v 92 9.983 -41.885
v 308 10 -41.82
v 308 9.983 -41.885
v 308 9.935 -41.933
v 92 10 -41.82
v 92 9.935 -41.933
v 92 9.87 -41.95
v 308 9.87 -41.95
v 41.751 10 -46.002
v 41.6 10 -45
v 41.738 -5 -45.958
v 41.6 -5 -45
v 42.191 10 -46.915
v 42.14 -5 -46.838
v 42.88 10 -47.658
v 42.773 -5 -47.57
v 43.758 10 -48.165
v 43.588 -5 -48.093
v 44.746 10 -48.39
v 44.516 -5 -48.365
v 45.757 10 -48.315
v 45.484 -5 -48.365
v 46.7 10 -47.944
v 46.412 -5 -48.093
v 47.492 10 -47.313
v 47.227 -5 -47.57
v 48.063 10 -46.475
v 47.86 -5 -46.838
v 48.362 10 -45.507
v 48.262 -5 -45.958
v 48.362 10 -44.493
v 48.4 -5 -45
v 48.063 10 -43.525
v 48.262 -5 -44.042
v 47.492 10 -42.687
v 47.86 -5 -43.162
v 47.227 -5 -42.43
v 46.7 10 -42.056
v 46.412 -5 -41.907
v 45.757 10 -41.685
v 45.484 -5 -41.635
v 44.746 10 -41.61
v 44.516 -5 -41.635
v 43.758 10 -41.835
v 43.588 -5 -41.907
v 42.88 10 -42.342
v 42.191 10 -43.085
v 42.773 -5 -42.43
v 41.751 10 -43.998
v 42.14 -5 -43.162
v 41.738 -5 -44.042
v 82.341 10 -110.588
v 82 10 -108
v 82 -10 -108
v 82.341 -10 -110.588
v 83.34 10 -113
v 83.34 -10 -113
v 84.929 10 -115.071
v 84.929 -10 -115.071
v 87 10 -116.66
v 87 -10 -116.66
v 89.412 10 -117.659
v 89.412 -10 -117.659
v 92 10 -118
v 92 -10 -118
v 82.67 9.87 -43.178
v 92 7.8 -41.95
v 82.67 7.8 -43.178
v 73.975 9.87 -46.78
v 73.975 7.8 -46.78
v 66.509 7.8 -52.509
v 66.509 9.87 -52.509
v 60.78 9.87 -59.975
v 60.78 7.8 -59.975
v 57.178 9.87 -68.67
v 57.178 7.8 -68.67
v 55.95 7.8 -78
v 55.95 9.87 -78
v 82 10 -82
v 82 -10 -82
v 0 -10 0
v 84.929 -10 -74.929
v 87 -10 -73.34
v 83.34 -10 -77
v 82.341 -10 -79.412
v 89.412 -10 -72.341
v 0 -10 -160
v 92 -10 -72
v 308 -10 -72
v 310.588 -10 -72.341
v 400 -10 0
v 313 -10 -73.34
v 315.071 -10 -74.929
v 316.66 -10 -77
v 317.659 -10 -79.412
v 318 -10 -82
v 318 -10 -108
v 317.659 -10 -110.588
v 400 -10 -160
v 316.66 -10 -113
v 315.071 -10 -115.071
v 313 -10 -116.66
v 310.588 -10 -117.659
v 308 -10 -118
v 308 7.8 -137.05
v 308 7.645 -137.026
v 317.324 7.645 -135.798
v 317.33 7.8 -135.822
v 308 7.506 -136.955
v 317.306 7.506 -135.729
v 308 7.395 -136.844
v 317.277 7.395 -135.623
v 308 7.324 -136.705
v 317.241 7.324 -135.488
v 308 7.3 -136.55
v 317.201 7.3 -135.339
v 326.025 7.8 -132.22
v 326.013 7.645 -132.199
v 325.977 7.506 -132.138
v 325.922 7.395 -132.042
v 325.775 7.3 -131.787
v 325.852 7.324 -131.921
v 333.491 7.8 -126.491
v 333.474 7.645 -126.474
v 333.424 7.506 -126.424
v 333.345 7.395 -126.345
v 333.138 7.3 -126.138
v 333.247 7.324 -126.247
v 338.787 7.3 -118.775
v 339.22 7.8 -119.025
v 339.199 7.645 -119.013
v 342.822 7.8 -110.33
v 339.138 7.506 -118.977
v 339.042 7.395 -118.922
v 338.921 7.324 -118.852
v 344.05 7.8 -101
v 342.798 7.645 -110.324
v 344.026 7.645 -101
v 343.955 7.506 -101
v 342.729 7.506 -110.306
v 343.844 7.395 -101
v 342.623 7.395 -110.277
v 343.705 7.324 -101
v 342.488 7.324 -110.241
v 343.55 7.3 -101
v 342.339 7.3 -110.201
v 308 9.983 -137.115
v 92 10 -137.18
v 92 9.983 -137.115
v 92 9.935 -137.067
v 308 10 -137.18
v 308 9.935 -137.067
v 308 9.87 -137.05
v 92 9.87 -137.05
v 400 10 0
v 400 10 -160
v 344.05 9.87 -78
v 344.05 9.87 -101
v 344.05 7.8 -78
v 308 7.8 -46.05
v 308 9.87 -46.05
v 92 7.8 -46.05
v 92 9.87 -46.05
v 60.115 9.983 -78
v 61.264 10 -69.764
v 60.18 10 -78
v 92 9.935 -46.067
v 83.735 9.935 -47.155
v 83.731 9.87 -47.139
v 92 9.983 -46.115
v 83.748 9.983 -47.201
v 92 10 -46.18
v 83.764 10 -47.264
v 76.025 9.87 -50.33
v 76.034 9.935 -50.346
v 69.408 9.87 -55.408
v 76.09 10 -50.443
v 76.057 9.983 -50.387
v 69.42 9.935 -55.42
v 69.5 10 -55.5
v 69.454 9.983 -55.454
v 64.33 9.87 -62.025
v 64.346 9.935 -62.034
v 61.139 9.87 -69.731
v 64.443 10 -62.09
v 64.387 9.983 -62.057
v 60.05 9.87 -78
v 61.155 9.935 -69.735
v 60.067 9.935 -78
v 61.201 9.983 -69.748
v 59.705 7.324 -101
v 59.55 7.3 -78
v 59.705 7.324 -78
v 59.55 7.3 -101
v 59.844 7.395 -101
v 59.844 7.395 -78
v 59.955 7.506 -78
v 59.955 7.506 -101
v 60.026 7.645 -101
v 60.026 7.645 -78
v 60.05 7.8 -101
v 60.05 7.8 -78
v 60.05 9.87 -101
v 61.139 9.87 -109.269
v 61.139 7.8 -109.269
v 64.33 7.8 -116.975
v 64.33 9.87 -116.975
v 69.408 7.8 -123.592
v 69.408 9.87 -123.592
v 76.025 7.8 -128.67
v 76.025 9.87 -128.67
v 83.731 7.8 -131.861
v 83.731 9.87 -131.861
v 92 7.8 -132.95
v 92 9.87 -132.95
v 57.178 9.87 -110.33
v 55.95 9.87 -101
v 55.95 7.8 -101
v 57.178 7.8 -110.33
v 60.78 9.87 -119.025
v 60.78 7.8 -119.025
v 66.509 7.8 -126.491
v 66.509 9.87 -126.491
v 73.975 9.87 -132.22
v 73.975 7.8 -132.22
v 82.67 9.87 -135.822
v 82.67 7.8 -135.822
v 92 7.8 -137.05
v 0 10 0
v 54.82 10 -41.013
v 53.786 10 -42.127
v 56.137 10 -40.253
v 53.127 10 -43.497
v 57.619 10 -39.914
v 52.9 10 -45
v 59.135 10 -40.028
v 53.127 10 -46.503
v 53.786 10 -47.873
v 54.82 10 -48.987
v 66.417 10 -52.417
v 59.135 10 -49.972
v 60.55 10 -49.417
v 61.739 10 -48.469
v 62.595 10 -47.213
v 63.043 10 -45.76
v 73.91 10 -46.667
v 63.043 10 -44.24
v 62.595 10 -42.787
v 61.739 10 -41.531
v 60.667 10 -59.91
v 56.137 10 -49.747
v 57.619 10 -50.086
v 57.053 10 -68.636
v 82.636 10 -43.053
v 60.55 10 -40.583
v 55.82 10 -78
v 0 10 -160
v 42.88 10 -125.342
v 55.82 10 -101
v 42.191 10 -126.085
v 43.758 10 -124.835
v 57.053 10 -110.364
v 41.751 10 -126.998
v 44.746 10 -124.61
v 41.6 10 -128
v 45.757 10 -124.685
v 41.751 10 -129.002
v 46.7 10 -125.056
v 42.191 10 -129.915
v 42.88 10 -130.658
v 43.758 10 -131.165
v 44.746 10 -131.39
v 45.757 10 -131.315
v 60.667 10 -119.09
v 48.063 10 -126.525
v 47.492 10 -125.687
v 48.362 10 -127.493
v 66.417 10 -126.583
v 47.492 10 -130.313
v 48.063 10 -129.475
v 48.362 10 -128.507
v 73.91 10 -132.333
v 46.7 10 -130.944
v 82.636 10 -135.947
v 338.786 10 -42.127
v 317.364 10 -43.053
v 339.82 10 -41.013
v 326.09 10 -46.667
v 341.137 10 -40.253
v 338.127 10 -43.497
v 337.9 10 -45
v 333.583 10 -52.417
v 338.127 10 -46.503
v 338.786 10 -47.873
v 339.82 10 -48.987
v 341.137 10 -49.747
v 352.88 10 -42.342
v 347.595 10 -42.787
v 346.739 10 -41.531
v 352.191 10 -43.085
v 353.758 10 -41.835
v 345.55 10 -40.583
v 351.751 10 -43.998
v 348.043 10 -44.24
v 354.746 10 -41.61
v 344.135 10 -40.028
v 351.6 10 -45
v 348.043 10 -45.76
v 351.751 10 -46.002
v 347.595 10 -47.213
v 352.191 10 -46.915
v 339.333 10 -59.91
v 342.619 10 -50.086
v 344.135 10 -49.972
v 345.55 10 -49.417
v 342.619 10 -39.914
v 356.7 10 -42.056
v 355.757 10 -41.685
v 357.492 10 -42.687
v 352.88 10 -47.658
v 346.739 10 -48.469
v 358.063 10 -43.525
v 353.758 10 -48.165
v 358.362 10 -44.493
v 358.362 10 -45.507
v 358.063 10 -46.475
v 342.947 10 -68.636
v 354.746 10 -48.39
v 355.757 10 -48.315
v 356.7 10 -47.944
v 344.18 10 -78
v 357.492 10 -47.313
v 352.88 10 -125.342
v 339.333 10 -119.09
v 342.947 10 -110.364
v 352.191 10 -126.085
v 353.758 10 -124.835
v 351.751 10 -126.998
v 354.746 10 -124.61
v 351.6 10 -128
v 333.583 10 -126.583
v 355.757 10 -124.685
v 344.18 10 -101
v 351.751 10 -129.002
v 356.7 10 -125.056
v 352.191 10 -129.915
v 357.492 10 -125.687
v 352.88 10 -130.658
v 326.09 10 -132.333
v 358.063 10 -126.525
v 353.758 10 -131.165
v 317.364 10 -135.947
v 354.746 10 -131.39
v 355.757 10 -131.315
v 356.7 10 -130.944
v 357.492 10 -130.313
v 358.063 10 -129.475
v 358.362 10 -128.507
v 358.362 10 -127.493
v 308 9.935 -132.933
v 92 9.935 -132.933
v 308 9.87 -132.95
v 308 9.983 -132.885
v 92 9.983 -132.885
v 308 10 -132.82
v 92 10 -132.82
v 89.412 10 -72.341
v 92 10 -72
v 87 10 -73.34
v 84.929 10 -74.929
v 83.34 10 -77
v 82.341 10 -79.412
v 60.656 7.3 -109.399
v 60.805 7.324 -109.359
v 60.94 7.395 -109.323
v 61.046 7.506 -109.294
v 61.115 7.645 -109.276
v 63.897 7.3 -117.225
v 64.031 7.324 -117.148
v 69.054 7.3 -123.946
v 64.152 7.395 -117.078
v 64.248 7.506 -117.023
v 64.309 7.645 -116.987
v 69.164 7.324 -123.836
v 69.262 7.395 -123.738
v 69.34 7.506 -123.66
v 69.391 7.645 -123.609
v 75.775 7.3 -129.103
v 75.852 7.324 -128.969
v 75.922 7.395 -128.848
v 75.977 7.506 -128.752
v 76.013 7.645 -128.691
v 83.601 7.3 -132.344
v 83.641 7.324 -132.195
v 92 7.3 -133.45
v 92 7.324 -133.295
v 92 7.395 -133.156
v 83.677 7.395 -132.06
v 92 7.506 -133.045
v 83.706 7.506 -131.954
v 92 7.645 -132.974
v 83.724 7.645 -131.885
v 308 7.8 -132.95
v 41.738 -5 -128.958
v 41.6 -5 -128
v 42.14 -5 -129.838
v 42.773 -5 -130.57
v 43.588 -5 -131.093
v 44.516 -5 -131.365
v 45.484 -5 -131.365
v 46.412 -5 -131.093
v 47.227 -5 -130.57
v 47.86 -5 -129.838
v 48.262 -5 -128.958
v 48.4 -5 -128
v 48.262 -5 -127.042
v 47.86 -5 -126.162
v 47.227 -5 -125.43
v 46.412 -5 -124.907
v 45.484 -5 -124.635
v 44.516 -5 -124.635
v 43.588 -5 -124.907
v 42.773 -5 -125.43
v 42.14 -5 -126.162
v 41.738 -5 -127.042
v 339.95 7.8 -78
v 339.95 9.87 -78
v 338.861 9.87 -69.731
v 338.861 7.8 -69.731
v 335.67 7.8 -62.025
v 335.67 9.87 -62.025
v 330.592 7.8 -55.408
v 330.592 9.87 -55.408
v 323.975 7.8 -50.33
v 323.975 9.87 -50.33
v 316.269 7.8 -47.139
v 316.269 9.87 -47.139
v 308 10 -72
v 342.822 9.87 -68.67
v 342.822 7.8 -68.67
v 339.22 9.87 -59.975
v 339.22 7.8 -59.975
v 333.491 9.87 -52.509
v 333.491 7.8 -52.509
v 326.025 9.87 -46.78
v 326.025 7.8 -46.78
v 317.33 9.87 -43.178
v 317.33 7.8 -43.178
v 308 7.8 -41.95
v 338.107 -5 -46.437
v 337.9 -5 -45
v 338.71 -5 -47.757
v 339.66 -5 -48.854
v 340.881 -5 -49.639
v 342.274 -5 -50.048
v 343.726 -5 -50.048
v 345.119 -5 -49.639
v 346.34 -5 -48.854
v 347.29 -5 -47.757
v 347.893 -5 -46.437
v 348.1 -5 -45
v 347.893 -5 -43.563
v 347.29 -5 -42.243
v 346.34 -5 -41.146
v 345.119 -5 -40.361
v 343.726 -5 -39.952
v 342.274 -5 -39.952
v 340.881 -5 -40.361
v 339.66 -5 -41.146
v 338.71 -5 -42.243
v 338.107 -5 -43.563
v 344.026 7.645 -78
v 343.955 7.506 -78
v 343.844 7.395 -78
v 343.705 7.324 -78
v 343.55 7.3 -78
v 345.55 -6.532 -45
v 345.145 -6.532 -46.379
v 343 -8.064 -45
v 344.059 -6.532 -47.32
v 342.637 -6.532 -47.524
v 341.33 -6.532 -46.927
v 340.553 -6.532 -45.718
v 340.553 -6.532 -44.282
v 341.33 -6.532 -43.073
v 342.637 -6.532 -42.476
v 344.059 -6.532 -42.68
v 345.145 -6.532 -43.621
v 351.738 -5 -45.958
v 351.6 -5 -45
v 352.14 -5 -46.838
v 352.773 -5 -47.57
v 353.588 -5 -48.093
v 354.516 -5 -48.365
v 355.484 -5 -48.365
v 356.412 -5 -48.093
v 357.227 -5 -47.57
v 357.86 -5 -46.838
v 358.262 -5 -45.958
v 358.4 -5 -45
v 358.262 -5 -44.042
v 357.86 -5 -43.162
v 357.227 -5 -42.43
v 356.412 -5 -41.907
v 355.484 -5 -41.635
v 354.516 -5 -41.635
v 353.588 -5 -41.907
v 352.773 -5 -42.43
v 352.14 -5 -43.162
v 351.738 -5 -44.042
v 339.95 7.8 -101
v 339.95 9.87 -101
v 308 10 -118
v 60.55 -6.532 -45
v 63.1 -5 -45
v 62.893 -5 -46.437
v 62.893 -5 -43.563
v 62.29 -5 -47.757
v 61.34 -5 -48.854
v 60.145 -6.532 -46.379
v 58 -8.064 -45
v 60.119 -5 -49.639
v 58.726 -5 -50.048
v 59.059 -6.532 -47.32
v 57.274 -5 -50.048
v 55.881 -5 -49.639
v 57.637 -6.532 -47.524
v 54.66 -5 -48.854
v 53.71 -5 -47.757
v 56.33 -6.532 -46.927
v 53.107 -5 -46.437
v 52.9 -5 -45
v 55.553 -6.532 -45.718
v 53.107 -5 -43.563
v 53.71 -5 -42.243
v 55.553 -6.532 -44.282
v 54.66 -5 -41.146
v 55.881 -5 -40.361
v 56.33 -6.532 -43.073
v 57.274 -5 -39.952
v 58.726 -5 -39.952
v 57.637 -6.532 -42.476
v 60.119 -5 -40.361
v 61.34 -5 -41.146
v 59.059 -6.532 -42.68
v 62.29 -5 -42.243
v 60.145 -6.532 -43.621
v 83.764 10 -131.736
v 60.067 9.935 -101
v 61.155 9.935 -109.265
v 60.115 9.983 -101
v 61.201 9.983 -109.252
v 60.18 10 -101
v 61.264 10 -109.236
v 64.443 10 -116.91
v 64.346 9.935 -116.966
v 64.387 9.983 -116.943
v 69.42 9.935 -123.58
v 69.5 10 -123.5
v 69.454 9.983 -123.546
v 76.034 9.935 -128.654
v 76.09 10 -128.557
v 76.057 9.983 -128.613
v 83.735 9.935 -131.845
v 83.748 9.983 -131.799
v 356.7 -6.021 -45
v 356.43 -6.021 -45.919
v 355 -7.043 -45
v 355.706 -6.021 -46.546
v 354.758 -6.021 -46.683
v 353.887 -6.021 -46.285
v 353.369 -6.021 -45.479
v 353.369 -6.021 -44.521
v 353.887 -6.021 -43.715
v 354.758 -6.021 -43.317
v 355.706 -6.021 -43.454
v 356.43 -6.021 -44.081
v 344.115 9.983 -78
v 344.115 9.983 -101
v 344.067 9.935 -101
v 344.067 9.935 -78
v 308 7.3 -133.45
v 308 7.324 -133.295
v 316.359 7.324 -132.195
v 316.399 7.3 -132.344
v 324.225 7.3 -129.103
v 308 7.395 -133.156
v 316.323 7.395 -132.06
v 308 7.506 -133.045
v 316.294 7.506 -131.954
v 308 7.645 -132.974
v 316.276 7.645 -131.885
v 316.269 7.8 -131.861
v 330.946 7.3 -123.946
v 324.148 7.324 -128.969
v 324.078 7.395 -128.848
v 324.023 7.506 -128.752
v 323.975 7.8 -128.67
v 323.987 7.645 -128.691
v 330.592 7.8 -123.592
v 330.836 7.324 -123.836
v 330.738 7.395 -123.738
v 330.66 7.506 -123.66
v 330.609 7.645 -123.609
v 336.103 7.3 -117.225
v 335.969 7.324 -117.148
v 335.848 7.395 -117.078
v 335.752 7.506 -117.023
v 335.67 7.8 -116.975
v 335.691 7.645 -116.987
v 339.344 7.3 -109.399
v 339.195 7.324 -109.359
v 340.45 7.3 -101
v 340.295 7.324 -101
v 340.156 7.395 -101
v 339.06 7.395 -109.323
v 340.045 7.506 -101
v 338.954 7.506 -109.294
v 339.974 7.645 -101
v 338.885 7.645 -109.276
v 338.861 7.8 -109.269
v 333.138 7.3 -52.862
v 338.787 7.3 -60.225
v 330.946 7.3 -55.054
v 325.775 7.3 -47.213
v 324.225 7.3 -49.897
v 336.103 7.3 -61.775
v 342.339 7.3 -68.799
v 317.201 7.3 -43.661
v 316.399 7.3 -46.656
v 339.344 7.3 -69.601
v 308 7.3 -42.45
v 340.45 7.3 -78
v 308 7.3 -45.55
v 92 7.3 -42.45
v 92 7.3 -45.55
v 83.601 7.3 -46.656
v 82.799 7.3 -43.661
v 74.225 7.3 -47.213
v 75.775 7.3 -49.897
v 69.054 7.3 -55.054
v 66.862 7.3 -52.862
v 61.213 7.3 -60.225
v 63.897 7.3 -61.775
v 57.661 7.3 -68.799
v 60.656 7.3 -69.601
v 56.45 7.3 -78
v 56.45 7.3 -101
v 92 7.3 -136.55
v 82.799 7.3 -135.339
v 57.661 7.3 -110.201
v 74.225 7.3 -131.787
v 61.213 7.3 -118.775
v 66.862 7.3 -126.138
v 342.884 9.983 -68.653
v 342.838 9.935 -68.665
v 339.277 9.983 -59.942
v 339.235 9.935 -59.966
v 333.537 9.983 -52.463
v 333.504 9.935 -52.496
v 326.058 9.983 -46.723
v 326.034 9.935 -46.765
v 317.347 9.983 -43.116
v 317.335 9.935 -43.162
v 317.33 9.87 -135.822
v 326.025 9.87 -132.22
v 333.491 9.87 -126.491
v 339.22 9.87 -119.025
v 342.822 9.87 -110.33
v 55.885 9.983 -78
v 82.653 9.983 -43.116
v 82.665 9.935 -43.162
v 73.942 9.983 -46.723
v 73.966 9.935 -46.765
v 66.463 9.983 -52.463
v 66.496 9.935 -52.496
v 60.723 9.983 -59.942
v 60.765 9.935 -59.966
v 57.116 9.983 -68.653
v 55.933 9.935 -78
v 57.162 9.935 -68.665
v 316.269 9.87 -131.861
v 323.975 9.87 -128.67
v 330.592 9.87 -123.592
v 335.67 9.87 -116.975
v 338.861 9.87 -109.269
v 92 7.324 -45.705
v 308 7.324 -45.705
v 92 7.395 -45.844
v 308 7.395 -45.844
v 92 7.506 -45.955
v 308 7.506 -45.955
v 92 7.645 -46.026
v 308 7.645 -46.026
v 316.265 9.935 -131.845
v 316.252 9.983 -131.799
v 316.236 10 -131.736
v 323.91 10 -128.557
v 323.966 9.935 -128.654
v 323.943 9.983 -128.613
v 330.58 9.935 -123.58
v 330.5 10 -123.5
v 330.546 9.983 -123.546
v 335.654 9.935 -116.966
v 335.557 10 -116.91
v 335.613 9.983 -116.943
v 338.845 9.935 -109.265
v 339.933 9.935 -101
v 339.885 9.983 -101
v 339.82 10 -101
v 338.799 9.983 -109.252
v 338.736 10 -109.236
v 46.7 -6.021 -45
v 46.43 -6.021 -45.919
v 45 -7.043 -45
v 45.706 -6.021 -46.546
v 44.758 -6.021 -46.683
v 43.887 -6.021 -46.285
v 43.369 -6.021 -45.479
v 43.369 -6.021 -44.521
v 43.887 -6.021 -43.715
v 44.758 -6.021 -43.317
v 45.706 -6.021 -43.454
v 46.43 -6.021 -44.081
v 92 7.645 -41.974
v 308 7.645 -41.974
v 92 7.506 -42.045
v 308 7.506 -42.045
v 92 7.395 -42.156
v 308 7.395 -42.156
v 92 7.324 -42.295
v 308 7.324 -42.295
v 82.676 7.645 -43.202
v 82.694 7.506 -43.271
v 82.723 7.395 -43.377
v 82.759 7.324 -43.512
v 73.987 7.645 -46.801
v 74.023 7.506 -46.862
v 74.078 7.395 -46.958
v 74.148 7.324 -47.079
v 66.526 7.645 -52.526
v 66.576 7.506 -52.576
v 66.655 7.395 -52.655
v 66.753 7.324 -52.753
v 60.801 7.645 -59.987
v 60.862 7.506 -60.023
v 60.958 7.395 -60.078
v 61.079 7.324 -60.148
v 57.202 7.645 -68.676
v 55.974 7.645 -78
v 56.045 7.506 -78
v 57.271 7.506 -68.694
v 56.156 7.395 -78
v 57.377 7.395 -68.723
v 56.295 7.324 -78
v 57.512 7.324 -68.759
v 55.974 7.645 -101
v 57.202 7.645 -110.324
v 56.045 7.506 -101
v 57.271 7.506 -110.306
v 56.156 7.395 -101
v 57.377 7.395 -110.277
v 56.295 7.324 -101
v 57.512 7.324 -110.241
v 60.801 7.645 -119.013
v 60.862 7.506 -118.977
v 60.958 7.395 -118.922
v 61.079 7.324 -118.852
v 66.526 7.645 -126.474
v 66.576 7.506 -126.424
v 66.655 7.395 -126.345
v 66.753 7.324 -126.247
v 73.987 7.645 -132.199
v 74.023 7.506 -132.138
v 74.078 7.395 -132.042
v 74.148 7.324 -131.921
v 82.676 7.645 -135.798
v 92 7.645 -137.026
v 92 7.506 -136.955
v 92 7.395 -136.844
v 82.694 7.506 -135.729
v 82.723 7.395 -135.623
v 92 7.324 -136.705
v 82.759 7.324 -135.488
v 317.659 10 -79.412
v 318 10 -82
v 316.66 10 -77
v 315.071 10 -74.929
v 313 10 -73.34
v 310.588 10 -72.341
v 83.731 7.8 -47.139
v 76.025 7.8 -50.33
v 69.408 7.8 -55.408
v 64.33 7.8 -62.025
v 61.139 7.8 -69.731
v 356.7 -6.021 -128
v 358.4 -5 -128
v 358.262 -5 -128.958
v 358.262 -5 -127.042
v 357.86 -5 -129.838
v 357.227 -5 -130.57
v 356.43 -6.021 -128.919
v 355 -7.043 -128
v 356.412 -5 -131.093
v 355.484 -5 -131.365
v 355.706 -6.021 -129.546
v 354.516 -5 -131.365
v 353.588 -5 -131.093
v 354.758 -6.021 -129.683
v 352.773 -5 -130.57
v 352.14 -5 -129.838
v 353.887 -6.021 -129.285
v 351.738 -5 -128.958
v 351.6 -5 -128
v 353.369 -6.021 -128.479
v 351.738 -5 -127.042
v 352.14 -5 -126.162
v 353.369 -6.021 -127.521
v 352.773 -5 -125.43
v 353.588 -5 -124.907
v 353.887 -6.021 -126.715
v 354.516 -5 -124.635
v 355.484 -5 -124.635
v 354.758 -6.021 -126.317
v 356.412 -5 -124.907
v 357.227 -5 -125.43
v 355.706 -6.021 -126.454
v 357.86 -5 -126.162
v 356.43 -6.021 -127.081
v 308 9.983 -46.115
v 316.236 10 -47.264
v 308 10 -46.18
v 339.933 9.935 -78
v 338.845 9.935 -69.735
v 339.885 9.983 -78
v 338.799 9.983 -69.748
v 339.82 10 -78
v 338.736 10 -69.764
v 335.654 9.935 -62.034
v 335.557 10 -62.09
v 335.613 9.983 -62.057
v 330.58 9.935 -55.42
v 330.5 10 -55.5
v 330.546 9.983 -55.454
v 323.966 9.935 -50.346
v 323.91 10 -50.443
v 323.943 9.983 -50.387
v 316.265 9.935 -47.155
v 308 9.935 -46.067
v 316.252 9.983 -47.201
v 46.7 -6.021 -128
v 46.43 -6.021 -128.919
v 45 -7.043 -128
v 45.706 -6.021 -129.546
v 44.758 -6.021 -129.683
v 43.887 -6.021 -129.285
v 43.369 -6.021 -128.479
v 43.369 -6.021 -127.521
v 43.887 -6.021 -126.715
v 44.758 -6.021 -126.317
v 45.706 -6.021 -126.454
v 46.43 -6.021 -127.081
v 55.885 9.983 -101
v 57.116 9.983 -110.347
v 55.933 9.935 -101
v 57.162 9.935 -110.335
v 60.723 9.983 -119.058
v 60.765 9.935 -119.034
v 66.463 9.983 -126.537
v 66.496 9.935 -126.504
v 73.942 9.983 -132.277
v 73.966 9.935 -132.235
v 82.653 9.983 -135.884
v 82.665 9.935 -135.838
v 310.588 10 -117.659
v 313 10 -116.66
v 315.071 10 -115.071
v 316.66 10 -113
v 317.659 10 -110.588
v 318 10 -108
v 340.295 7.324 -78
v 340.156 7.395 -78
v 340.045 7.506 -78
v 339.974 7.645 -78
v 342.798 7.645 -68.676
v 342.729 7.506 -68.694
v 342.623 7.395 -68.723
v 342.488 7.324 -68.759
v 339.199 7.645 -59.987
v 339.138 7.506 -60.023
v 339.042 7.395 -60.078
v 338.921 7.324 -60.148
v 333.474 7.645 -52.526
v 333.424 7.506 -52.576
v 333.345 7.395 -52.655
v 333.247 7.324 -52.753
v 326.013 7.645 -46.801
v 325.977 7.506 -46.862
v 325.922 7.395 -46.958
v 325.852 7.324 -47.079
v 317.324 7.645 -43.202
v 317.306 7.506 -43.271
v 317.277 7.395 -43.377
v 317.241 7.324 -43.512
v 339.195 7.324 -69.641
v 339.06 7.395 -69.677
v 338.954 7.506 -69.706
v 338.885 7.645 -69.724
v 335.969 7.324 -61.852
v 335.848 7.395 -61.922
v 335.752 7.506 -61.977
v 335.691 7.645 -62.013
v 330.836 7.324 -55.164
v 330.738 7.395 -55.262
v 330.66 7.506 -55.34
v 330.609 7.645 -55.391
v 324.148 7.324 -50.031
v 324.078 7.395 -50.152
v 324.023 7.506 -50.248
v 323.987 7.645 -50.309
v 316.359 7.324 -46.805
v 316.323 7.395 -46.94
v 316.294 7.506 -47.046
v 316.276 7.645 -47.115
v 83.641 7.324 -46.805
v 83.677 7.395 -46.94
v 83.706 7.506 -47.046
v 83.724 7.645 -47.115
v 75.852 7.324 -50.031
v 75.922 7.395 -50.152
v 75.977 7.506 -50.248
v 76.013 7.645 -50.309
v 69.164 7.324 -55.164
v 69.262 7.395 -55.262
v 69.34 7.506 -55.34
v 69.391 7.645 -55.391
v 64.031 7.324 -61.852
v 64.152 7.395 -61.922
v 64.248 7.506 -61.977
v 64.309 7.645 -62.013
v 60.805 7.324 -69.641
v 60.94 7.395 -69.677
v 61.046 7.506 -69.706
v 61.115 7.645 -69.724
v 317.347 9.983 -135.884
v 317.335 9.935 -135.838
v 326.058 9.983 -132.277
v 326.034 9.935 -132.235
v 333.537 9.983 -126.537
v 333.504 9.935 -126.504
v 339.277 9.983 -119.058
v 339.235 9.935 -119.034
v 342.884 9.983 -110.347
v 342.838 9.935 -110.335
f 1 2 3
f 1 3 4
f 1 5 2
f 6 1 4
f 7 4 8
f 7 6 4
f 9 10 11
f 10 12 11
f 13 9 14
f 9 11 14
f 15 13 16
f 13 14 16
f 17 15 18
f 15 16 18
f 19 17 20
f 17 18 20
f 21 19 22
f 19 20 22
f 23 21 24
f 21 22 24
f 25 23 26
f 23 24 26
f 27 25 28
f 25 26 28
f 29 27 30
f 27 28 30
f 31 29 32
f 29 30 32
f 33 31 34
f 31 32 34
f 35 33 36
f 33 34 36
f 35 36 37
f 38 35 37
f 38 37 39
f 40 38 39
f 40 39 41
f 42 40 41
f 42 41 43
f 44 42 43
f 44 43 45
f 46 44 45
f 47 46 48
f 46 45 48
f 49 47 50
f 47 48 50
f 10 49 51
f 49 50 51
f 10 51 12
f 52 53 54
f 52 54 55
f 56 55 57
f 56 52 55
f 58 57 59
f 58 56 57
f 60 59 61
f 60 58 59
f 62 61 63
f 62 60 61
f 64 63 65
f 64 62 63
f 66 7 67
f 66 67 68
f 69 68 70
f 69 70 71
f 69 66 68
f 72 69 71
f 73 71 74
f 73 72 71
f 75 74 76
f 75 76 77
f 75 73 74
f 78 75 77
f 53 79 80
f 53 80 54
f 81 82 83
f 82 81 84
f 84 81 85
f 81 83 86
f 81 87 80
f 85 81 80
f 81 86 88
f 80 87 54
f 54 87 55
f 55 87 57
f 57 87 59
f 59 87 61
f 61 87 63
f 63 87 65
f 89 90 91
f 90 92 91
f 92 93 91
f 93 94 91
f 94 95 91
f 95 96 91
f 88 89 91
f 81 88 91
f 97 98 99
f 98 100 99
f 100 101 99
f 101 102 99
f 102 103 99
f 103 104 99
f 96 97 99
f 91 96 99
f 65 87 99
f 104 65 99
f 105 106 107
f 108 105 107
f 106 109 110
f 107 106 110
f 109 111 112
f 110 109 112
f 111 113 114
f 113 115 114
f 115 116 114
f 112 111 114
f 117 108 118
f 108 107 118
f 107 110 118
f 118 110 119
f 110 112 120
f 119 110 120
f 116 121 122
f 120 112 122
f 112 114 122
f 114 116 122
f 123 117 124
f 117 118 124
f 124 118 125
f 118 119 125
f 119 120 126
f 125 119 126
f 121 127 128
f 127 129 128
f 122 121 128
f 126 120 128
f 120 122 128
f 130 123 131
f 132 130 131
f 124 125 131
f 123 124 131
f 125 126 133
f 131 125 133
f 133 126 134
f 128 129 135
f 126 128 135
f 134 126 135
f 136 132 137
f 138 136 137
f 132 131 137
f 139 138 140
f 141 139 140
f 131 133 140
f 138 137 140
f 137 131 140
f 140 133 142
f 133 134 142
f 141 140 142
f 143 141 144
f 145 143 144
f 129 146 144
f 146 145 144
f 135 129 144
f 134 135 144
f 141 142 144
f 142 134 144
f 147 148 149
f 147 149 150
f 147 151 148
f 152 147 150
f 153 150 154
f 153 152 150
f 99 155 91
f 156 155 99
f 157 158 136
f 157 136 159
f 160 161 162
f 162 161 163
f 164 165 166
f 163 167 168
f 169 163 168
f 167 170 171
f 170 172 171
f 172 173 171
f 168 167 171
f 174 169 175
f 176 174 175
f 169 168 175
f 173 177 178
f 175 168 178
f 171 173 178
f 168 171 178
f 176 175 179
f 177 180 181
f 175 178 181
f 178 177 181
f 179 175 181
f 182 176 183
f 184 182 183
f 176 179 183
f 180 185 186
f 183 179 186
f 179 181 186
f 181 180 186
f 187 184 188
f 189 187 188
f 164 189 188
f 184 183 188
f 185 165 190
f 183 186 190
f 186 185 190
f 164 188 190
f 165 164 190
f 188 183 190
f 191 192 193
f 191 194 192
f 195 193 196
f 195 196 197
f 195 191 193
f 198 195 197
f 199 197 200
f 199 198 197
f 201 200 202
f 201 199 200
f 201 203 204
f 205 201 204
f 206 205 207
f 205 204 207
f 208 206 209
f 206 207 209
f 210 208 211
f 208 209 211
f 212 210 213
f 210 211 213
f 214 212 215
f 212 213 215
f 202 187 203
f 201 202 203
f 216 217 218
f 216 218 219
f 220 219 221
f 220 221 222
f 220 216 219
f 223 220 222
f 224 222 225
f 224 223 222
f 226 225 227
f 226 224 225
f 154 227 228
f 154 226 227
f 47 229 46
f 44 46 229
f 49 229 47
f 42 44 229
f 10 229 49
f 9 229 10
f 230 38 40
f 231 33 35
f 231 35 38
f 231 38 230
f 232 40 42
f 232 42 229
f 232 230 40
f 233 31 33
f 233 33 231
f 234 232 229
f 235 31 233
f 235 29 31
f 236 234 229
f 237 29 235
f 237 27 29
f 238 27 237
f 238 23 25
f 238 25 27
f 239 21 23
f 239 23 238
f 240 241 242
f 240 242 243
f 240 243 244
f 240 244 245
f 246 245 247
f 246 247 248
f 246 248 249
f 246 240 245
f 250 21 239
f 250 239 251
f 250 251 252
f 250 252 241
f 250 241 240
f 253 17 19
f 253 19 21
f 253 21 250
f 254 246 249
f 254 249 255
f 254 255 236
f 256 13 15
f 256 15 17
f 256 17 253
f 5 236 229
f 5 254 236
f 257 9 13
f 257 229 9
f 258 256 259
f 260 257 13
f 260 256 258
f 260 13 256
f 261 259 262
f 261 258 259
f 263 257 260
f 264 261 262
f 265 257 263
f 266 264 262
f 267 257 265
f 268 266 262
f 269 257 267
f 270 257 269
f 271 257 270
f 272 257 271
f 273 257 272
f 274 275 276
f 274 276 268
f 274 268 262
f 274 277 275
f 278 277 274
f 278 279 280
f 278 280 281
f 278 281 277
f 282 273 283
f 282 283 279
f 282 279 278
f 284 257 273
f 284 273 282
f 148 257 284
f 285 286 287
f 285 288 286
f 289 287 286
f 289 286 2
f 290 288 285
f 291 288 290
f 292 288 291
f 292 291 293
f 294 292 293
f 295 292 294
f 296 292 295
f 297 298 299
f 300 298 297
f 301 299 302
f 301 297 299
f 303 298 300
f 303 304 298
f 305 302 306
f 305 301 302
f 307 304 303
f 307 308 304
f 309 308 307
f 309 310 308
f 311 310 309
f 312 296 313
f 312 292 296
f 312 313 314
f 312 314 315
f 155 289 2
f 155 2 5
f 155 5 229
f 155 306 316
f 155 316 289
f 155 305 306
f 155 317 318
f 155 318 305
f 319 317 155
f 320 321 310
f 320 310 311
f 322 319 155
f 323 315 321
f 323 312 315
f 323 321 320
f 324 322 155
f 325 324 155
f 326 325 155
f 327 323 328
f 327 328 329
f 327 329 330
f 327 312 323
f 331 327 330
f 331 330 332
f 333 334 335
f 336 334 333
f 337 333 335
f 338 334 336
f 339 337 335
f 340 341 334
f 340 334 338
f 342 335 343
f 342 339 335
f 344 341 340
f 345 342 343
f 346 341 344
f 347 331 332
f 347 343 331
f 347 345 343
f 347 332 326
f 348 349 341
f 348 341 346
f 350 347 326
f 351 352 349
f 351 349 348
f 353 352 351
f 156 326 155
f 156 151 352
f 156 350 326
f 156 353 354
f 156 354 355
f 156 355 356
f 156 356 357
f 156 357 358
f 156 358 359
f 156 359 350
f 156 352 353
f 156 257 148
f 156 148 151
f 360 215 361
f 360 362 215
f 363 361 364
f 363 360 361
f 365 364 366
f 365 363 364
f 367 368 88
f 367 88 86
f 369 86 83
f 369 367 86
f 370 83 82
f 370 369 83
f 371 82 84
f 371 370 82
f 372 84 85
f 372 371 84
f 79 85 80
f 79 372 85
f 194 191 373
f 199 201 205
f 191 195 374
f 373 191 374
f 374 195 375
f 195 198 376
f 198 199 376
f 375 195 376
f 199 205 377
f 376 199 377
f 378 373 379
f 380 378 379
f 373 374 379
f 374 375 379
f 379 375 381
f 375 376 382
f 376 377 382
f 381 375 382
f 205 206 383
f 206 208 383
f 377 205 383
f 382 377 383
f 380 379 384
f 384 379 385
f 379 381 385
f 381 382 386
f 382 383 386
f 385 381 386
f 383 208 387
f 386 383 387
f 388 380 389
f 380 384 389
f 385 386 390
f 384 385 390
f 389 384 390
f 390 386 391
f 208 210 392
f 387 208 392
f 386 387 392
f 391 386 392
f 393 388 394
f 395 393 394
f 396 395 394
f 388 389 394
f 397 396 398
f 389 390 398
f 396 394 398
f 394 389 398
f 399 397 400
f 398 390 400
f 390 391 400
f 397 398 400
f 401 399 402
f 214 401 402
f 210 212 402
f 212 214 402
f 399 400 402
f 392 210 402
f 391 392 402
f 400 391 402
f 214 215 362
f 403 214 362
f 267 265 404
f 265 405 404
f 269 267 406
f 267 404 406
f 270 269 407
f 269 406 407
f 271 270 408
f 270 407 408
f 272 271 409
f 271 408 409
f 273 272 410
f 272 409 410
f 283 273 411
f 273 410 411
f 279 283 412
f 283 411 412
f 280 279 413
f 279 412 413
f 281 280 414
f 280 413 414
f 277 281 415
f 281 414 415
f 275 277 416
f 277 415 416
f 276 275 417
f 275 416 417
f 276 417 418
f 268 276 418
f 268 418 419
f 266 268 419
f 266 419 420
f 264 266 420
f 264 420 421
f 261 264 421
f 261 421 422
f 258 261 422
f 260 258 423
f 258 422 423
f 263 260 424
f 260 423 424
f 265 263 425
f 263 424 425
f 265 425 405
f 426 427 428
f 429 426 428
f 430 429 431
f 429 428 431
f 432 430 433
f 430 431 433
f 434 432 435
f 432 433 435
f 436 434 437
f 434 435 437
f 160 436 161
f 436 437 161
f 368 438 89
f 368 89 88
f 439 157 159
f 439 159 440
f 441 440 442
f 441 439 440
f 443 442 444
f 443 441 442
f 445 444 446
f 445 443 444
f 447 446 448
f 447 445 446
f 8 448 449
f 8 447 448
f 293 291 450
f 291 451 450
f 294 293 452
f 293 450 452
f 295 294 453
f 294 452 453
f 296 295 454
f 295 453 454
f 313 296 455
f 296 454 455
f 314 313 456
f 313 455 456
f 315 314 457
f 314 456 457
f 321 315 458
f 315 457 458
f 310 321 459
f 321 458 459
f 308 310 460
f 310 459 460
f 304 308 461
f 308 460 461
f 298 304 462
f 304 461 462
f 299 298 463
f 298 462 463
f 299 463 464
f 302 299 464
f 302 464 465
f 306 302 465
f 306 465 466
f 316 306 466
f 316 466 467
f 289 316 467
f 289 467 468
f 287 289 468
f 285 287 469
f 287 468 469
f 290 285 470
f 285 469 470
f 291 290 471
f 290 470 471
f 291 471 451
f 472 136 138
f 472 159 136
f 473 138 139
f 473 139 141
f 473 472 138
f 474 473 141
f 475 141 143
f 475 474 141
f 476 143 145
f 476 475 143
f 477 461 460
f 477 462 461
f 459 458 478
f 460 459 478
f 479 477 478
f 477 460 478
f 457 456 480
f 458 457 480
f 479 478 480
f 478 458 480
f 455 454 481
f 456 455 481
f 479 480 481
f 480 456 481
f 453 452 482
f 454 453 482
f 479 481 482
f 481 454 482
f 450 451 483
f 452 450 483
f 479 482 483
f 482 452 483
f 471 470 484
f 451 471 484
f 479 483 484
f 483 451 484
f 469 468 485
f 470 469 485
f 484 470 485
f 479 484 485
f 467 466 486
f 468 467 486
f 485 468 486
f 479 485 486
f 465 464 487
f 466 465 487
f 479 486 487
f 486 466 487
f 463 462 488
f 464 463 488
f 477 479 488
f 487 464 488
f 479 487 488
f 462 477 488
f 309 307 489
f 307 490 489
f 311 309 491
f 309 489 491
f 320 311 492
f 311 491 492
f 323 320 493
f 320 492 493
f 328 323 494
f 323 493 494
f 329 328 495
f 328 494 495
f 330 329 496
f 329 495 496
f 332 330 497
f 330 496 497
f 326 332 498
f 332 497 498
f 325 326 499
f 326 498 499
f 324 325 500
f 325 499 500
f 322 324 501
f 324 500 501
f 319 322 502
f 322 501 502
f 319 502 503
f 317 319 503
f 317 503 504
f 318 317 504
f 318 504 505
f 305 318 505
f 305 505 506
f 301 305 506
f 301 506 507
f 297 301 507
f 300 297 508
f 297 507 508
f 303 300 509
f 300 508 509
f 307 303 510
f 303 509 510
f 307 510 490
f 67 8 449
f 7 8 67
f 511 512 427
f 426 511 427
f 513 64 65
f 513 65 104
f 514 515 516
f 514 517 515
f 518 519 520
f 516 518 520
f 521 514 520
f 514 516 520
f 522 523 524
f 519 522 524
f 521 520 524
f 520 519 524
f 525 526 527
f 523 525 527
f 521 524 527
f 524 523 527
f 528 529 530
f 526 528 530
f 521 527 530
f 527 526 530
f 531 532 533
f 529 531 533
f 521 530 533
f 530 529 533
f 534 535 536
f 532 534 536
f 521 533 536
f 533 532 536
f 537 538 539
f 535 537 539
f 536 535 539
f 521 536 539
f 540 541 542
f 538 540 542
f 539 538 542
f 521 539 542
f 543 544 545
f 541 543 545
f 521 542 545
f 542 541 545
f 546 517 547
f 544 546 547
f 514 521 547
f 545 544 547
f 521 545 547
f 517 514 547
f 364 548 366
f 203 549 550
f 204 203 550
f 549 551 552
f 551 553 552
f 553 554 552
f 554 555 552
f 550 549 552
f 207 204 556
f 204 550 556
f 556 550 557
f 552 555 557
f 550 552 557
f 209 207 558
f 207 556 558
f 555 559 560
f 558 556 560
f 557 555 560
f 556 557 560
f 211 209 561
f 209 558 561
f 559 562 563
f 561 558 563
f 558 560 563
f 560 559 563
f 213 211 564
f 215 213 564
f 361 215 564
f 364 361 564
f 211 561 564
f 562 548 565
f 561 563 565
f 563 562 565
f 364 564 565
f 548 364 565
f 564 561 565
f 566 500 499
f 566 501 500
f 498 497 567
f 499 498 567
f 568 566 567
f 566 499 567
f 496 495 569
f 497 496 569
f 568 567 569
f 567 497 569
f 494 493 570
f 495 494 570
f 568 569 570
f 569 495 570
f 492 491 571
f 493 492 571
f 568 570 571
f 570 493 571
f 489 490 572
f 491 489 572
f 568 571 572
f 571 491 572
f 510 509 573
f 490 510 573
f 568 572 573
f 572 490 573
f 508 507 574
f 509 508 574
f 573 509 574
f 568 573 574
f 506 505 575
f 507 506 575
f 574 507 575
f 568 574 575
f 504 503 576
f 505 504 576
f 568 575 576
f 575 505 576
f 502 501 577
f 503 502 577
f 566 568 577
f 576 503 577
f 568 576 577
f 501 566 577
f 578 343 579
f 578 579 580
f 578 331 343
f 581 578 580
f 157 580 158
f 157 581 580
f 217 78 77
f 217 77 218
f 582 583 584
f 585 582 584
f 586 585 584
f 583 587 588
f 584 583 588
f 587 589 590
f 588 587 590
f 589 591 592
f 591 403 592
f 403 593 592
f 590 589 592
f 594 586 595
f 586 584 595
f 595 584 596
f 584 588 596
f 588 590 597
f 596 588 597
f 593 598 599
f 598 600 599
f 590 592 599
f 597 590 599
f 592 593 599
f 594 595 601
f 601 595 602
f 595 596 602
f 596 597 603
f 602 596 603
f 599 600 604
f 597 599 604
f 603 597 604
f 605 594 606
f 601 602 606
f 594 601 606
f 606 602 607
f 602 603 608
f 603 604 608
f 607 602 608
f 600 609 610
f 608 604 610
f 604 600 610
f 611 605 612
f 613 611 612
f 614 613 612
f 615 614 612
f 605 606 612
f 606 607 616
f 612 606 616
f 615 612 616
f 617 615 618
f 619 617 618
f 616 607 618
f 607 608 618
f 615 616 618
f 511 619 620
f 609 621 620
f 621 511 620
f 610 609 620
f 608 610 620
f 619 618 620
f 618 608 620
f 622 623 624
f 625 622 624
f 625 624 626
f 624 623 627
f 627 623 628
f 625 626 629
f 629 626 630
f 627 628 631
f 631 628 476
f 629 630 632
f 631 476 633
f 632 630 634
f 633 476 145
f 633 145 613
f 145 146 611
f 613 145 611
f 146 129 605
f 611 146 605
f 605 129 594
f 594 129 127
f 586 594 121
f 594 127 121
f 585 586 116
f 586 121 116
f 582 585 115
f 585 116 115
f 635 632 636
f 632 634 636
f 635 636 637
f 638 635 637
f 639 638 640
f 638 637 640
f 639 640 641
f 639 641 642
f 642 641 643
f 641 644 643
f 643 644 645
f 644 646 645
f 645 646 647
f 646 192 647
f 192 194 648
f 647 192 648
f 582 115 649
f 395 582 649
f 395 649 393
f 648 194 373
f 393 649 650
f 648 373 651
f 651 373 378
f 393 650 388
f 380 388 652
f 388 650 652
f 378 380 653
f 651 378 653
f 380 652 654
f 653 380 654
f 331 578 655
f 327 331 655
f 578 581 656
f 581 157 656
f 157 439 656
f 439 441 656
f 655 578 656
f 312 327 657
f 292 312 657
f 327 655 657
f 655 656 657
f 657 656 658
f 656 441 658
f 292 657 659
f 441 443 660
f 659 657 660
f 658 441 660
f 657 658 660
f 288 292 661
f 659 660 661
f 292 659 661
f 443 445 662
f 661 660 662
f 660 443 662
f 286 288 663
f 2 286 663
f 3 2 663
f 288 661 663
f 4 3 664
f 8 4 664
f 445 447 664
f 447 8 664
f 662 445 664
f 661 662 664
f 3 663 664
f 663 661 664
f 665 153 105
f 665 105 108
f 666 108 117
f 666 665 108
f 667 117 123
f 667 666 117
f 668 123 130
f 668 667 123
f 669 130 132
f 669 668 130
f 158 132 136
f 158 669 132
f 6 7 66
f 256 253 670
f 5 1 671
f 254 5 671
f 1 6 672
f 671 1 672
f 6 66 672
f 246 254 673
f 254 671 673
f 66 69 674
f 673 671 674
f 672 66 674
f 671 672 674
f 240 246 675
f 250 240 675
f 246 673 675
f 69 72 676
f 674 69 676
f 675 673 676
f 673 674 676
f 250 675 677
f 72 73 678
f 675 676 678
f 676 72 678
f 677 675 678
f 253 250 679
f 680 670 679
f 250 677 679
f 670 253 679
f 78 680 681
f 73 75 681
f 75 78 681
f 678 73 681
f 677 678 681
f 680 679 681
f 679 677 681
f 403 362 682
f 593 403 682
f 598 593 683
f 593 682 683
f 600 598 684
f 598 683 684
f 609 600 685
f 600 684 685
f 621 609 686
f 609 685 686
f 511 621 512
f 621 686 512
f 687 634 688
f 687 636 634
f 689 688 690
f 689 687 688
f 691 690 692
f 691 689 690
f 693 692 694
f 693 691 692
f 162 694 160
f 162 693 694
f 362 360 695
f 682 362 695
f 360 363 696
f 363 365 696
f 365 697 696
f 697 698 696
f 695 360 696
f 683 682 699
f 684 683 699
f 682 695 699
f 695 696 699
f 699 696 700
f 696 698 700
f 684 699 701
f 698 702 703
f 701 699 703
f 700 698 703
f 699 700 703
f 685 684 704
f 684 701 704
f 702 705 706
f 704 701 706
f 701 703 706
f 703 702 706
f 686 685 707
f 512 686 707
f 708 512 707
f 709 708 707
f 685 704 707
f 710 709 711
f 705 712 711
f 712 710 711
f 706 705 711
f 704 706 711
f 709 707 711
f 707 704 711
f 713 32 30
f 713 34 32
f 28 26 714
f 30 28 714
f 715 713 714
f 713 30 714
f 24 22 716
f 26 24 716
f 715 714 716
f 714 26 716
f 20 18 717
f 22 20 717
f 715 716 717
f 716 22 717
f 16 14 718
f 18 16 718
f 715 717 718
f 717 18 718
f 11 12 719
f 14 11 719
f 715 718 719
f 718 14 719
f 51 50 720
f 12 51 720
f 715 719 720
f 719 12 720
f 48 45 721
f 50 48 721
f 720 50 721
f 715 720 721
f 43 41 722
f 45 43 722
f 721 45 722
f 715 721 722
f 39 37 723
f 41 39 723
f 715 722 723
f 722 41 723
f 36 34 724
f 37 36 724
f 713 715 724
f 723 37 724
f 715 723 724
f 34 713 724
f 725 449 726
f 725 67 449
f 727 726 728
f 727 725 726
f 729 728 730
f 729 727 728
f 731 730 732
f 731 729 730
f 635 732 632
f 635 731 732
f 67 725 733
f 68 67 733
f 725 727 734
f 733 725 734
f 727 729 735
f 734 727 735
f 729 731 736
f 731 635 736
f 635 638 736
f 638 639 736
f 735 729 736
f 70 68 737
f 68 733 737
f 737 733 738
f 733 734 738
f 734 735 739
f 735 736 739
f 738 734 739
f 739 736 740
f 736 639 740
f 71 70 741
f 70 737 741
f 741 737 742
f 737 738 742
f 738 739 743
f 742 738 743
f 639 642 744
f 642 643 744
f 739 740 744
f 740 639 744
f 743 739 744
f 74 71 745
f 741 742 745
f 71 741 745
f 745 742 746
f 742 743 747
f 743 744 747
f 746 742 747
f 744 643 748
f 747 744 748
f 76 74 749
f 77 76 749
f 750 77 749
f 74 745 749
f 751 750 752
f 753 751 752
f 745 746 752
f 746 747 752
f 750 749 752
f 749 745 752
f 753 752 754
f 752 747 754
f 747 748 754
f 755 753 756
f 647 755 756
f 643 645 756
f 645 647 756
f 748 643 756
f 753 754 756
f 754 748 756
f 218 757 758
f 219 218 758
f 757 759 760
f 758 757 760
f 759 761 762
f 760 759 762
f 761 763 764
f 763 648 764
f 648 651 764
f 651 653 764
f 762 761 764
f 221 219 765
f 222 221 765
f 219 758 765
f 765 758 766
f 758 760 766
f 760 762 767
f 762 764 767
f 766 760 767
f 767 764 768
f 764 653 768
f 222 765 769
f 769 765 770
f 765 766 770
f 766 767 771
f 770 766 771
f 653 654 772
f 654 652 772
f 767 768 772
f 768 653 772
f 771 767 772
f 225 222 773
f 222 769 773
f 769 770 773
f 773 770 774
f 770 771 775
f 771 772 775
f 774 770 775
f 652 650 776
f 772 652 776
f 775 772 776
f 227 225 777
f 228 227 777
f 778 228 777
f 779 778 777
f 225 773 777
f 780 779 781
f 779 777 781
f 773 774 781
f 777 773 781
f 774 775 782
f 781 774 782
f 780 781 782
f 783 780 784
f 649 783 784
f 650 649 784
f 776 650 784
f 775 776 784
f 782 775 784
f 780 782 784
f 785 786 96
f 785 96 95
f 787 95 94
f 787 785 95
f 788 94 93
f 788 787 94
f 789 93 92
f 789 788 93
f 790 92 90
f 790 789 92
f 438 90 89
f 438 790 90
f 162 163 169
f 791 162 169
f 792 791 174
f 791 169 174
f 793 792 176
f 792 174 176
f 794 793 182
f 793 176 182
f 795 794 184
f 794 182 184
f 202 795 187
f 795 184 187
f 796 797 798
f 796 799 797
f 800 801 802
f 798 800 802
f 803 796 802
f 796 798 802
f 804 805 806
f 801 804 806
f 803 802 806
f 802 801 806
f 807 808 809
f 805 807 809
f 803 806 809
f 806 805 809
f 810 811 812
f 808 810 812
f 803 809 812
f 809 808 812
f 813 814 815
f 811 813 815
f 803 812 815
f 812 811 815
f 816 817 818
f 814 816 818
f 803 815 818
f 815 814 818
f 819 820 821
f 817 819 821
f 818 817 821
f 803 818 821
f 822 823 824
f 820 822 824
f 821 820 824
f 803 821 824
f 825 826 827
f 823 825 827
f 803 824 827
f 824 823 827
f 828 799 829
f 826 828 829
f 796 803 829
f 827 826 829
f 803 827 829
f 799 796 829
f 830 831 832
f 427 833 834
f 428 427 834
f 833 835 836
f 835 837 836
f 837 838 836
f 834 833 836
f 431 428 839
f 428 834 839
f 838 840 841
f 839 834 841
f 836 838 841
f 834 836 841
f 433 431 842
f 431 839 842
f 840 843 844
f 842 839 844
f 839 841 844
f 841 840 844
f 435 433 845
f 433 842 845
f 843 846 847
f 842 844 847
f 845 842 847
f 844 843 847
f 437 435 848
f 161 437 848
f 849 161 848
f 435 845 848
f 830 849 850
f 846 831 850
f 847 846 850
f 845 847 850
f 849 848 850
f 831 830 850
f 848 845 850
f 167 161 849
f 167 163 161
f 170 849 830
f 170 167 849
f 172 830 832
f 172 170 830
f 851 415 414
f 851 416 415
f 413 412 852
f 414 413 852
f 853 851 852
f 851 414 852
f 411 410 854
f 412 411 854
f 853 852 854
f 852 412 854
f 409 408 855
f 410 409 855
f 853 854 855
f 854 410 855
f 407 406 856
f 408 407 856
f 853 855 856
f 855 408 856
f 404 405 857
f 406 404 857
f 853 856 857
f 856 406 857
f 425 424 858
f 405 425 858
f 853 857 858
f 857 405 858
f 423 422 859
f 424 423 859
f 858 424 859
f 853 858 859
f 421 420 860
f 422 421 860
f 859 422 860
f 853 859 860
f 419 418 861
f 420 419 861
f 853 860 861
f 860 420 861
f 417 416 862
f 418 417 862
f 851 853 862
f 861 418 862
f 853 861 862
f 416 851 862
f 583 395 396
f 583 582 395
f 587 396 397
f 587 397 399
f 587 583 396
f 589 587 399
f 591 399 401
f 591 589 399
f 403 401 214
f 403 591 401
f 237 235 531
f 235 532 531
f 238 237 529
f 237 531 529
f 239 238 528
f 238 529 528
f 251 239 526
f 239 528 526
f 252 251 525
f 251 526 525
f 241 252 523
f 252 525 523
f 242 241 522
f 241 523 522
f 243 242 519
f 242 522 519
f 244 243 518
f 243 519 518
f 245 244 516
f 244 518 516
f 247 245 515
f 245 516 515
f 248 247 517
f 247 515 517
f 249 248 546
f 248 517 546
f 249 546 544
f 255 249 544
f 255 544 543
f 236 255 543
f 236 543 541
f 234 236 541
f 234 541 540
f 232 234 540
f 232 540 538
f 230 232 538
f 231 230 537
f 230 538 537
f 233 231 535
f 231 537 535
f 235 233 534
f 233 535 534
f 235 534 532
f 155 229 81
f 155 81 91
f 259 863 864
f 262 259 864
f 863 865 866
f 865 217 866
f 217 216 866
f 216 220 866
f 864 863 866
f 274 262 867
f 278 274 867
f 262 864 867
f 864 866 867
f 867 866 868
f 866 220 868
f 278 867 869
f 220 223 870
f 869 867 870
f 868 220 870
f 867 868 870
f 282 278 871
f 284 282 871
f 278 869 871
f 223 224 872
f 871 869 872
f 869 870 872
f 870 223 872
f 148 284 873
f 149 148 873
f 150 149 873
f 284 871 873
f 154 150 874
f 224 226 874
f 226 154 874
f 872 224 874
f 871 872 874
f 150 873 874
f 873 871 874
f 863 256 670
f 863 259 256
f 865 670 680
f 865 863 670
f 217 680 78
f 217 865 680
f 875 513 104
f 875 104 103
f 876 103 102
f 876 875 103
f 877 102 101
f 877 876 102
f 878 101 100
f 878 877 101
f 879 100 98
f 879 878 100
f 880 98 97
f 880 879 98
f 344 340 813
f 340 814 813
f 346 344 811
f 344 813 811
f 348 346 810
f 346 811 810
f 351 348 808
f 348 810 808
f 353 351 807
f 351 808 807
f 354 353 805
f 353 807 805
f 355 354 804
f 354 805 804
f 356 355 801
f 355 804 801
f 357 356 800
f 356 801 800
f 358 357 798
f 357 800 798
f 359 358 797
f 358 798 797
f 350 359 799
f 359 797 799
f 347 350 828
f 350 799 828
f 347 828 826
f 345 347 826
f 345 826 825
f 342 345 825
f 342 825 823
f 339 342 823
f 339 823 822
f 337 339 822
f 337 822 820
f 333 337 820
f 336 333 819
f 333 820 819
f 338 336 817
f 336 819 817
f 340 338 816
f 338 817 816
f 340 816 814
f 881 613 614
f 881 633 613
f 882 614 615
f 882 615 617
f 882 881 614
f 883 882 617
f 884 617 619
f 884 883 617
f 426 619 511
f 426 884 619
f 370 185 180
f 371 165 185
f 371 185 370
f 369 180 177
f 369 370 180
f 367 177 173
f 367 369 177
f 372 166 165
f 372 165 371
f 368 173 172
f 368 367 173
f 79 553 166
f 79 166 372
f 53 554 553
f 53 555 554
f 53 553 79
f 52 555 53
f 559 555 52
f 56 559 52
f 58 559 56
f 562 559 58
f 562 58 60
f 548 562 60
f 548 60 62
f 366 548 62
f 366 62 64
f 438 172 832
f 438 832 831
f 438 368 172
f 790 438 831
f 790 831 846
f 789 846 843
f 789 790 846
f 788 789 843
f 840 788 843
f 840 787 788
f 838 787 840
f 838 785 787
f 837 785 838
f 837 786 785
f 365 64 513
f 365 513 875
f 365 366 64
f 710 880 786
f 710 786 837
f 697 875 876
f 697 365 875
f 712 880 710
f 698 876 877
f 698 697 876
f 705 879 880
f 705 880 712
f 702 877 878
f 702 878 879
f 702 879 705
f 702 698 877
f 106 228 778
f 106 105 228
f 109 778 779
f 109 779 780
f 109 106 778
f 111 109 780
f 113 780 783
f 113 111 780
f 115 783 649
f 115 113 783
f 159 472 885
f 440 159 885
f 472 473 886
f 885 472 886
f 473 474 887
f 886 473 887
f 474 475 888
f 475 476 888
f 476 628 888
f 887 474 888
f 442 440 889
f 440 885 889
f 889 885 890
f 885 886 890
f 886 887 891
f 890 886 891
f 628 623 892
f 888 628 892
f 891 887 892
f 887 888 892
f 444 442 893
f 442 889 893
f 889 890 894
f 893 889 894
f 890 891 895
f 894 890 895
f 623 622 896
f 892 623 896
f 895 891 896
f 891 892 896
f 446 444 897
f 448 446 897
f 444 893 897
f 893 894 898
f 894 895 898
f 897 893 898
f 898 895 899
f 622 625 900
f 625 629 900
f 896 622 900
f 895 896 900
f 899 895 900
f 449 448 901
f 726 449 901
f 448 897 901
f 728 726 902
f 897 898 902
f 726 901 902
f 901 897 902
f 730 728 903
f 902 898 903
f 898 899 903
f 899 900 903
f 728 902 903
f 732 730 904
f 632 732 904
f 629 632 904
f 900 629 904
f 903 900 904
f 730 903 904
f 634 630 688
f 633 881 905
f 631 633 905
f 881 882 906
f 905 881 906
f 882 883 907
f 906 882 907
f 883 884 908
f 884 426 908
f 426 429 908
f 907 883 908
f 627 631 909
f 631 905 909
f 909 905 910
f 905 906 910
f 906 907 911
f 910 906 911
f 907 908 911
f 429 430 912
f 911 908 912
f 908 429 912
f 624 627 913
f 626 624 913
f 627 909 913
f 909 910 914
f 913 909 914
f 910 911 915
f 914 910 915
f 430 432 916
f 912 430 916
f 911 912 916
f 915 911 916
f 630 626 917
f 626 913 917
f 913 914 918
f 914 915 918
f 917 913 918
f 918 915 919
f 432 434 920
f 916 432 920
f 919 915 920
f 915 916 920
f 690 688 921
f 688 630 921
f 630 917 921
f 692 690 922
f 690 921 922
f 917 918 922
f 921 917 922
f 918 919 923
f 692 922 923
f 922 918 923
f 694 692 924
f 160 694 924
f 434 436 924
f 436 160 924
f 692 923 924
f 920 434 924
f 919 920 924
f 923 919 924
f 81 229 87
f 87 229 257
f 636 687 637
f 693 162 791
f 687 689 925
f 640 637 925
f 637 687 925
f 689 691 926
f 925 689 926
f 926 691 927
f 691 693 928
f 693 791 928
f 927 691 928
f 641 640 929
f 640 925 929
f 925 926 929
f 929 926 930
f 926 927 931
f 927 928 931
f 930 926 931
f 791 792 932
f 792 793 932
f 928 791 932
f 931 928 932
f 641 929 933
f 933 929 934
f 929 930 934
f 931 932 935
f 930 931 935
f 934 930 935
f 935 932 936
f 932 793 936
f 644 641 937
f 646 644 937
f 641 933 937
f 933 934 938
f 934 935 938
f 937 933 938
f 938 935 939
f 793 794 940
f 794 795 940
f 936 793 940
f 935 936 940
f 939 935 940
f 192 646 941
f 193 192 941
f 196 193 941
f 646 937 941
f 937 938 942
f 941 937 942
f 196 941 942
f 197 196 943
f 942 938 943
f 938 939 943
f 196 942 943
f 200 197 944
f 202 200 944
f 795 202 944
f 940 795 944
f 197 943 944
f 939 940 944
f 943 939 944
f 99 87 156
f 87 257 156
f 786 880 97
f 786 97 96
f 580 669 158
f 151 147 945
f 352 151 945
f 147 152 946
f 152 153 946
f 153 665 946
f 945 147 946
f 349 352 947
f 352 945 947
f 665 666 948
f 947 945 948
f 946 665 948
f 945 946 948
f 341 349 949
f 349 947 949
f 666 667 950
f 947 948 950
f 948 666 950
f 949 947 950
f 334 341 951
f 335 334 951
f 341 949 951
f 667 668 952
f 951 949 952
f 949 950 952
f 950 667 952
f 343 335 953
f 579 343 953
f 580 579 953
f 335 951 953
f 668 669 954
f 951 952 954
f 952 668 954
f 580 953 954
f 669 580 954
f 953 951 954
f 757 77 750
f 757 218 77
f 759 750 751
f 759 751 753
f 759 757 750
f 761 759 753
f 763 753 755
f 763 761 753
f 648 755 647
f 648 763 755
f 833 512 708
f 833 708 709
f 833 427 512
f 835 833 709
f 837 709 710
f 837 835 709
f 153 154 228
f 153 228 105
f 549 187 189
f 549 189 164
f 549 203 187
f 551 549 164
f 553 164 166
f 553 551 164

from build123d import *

# Parameters (mm, degrees)
SKETCH_1_W              = 400
SKETCH_1_H              = 160
EXTRUDE_1_DEPTH         = 10
CUT_EXTRUDE_1_DEPTH     = 2.7
FILLET_1_R              = 0.13
FILLET_2_R              = 0.5
CUT_EXTRUDE_2_DEPTH     = 432.277173057
HOLE_WIZARD_M12_1_D     = 10.2
HOLE_WIZARD_M12_1_DEPTH = 15
HOLE_WIZARD_M12_1_TIP   = 3.064389157
HOLE_WIZARD_M8_1_D      = 6.8
HOLE_WIZARD_M8_1_DEPTH  = 15
HOLE_WIZARD_M8_1_TIP    = 2.042926105


with BuildPart() as part:
    # 스케치1 → 보스-돌출1 (new, symmetric)
    with BuildSketch(Plane(origin=(0, 0, 0), x_dir=(1, 0, 0), z_dir=(0, 1, 0))):
        with Locations((200, 80)):
            Rectangle(SKETCH_1_W, SKETCH_1_H)
    extrude(amount=EXTRUDE_1_DEPTH, both=True)

    # 스케치2 → 컷-돌출1 (cut)
    with BuildSketch(Plane(origin=(0, 10, 0), x_dir=(1, 0, 0), z_dir=(0, 1, 0))):
        with BuildLine():
            Line((92, 137.05), (308, 137.05))
            ThreePointArc((308, 137.05), (333.491199462, 126.491199462), (344.05, 101))
            Line((344.05, 101), (344.05, 78))
            ThreePointArc((344.05, 78), (333.491199462, 52.508800538), (308, 41.95))
            Line((308, 41.95), (92, 41.95))
            ThreePointArc((92, 41.95), (66.508800538, 52.508800538), (55.95, 78))
            Line((55.95, 78), (55.95, 101))
            ThreePointArc((55.95, 101), (66.508800538, 126.491199462), (92, 137.05))
        make_face()
        with BuildLine():
            Line((92, 132.95), (308, 132.95))
            ThreePointArc((308, 132.95), (330.592061659, 123.592061659), (339.95, 101))
            Line((339.95, 101), (339.95, 78))
            ThreePointArc((339.95, 78), (330.592061659, 55.407938341), (308, 46.05))
            Line((308, 46.05), (92, 46.05))
            ThreePointArc((92, 46.05), (69.407938341, 55.407938341), (60.05, 78))
            Line((60.05, 78), (60.05, 101))
            ThreePointArc((60.05, 101), (69.407938341, 123.592061659), (92, 132.95))
        make_face(mode=Mode.SUBTRACT)
    extrude(amount=-CUT_EXTRUDE_1_DEPTH, mode=Mode.SUBTRACT)

    # 필렛1
    fillet_1_edges = [part.edges().sort_by_distance(p)[0] for p in [
        (66.508800538, 10, -126.491199462),
        (55.95, 10, -89.5),
        (66.508800538, 10, -52.508800538),
        (200, 10, -41.95),
        (333.491199462, 10, -52.508800538),
        (344.05, 10, -89.5),
        (333.491199462, 10, -126.491199462),
        (200, 10, -137.05),
        (69.407938341, 10, -123.592061659),
        (200, 10, -132.95),
        (330.592061659, 10, -123.592061659),
        (339.95, 10, -89.5),
        (330.592061659, 10, -55.407938341),
        (200, 10, -46.05),
        (69.407938341, 10, -55.407938341),
        (60.05, 10, -89.5),
    ]]
    fillet(fillet_1_edges, radius=FILLET_1_R)

    # 필렛2
    fillet_2_edges = [part.edges().sort_by_distance(p)[0] for p in [
        (66.508800538, 7.3, -126.491199462),
        (200, 7.3, -137.05),
        (333.491199462, 7.3, -126.491199462),
        (344.05, 7.3, -89.5),
        (333.491199462, 7.3, -52.508800538),
        (200, 7.3, -41.95),
        (66.508800538, 7.3, -52.508800538),
        (55.95, 7.3, -89.5),
        (200, 7.3, -132.95),
        (69.407938341, 7.3, -123.592061659),
        (60.05, 7.3, -89.5),
        (69.407938341, 7.3, -55.407938341),
        (200, 7.3, -46.05),
        (330.592061659, 7.3, -55.407938341),
        (339.95, 7.3, -89.5),
        (330.592061659, 7.3, -123.592061659),
    ]]
    fillet(fillet_2_edges, radius=FILLET_2_R)

    # 스케치3 → 컷-돌출2 (cut, through all)
    with BuildSketch(Plane(origin=(0, 10, 0), x_dir=(1, 0, 0), z_dir=(0, 1, 0))):
        with BuildLine():
            Line((92, 118), (308, 118))
            ThreePointArc((308, 118), (315.071067812, 115.071067812), (318, 108))
            Line((318, 108), (318, 82))
            ThreePointArc((318, 82), (315.071067812, 74.928932188), (308, 72))
            Line((308, 72), (92, 72))
            ThreePointArc((92, 72), (84.928932188, 74.928932188), (82, 82))
            Line((82, 82), (82, 108))
            ThreePointArc((82, 108), (84.928932188, 115.071067812), (92, 118))
        make_face()
    extrude(amount=-CUT_EXTRUDE_2_DEPTH, mode=Mode.SUBTRACT)

    # M12 나사 구멍1
    with Locations(Plane(origin=(0, 10, 0), x_dir=(1, 0, 0), z_dir=(0, 1, 0))):
        with Locations((58, 45), (343, 45)):
            Hole(HOLE_WIZARD_M12_1_D / 2, depth=HOLE_WIZARD_M12_1_DEPTH)
            with Locations((0, 0, -(HOLE_WIZARD_M12_1_DEPTH + HOLE_WIZARD_M12_1_TIP / 2))):  # 118° drill point
                Cone(0, HOLE_WIZARD_M12_1_D / 2, HOLE_WIZARD_M12_1_TIP, mode=Mode.SUBTRACT)

    # M8 나사 구멍1
    with Locations(Plane(origin=(0, 10, 0), x_dir=(1, 0, 0), z_dir=(0, 1, 0))):
        with Locations((45, 128), (45, 45), (355, 128), (355, 45)):
            Hole(HOLE_WIZARD_M8_1_D / 2, depth=HOLE_WIZARD_M8_1_DEPTH)
            with Locations((0, 0, -(HOLE_WIZARD_M8_1_DEPTH + HOLE_WIZARD_M8_1_TIP / 2))):  # 118° drill point
                Cone(0, HOLE_WIZARD_M8_1_D / 2, HOLE_WIZARD_M8_1_TIP, mode=Mode.SUBTRACT)


solid = part.part
